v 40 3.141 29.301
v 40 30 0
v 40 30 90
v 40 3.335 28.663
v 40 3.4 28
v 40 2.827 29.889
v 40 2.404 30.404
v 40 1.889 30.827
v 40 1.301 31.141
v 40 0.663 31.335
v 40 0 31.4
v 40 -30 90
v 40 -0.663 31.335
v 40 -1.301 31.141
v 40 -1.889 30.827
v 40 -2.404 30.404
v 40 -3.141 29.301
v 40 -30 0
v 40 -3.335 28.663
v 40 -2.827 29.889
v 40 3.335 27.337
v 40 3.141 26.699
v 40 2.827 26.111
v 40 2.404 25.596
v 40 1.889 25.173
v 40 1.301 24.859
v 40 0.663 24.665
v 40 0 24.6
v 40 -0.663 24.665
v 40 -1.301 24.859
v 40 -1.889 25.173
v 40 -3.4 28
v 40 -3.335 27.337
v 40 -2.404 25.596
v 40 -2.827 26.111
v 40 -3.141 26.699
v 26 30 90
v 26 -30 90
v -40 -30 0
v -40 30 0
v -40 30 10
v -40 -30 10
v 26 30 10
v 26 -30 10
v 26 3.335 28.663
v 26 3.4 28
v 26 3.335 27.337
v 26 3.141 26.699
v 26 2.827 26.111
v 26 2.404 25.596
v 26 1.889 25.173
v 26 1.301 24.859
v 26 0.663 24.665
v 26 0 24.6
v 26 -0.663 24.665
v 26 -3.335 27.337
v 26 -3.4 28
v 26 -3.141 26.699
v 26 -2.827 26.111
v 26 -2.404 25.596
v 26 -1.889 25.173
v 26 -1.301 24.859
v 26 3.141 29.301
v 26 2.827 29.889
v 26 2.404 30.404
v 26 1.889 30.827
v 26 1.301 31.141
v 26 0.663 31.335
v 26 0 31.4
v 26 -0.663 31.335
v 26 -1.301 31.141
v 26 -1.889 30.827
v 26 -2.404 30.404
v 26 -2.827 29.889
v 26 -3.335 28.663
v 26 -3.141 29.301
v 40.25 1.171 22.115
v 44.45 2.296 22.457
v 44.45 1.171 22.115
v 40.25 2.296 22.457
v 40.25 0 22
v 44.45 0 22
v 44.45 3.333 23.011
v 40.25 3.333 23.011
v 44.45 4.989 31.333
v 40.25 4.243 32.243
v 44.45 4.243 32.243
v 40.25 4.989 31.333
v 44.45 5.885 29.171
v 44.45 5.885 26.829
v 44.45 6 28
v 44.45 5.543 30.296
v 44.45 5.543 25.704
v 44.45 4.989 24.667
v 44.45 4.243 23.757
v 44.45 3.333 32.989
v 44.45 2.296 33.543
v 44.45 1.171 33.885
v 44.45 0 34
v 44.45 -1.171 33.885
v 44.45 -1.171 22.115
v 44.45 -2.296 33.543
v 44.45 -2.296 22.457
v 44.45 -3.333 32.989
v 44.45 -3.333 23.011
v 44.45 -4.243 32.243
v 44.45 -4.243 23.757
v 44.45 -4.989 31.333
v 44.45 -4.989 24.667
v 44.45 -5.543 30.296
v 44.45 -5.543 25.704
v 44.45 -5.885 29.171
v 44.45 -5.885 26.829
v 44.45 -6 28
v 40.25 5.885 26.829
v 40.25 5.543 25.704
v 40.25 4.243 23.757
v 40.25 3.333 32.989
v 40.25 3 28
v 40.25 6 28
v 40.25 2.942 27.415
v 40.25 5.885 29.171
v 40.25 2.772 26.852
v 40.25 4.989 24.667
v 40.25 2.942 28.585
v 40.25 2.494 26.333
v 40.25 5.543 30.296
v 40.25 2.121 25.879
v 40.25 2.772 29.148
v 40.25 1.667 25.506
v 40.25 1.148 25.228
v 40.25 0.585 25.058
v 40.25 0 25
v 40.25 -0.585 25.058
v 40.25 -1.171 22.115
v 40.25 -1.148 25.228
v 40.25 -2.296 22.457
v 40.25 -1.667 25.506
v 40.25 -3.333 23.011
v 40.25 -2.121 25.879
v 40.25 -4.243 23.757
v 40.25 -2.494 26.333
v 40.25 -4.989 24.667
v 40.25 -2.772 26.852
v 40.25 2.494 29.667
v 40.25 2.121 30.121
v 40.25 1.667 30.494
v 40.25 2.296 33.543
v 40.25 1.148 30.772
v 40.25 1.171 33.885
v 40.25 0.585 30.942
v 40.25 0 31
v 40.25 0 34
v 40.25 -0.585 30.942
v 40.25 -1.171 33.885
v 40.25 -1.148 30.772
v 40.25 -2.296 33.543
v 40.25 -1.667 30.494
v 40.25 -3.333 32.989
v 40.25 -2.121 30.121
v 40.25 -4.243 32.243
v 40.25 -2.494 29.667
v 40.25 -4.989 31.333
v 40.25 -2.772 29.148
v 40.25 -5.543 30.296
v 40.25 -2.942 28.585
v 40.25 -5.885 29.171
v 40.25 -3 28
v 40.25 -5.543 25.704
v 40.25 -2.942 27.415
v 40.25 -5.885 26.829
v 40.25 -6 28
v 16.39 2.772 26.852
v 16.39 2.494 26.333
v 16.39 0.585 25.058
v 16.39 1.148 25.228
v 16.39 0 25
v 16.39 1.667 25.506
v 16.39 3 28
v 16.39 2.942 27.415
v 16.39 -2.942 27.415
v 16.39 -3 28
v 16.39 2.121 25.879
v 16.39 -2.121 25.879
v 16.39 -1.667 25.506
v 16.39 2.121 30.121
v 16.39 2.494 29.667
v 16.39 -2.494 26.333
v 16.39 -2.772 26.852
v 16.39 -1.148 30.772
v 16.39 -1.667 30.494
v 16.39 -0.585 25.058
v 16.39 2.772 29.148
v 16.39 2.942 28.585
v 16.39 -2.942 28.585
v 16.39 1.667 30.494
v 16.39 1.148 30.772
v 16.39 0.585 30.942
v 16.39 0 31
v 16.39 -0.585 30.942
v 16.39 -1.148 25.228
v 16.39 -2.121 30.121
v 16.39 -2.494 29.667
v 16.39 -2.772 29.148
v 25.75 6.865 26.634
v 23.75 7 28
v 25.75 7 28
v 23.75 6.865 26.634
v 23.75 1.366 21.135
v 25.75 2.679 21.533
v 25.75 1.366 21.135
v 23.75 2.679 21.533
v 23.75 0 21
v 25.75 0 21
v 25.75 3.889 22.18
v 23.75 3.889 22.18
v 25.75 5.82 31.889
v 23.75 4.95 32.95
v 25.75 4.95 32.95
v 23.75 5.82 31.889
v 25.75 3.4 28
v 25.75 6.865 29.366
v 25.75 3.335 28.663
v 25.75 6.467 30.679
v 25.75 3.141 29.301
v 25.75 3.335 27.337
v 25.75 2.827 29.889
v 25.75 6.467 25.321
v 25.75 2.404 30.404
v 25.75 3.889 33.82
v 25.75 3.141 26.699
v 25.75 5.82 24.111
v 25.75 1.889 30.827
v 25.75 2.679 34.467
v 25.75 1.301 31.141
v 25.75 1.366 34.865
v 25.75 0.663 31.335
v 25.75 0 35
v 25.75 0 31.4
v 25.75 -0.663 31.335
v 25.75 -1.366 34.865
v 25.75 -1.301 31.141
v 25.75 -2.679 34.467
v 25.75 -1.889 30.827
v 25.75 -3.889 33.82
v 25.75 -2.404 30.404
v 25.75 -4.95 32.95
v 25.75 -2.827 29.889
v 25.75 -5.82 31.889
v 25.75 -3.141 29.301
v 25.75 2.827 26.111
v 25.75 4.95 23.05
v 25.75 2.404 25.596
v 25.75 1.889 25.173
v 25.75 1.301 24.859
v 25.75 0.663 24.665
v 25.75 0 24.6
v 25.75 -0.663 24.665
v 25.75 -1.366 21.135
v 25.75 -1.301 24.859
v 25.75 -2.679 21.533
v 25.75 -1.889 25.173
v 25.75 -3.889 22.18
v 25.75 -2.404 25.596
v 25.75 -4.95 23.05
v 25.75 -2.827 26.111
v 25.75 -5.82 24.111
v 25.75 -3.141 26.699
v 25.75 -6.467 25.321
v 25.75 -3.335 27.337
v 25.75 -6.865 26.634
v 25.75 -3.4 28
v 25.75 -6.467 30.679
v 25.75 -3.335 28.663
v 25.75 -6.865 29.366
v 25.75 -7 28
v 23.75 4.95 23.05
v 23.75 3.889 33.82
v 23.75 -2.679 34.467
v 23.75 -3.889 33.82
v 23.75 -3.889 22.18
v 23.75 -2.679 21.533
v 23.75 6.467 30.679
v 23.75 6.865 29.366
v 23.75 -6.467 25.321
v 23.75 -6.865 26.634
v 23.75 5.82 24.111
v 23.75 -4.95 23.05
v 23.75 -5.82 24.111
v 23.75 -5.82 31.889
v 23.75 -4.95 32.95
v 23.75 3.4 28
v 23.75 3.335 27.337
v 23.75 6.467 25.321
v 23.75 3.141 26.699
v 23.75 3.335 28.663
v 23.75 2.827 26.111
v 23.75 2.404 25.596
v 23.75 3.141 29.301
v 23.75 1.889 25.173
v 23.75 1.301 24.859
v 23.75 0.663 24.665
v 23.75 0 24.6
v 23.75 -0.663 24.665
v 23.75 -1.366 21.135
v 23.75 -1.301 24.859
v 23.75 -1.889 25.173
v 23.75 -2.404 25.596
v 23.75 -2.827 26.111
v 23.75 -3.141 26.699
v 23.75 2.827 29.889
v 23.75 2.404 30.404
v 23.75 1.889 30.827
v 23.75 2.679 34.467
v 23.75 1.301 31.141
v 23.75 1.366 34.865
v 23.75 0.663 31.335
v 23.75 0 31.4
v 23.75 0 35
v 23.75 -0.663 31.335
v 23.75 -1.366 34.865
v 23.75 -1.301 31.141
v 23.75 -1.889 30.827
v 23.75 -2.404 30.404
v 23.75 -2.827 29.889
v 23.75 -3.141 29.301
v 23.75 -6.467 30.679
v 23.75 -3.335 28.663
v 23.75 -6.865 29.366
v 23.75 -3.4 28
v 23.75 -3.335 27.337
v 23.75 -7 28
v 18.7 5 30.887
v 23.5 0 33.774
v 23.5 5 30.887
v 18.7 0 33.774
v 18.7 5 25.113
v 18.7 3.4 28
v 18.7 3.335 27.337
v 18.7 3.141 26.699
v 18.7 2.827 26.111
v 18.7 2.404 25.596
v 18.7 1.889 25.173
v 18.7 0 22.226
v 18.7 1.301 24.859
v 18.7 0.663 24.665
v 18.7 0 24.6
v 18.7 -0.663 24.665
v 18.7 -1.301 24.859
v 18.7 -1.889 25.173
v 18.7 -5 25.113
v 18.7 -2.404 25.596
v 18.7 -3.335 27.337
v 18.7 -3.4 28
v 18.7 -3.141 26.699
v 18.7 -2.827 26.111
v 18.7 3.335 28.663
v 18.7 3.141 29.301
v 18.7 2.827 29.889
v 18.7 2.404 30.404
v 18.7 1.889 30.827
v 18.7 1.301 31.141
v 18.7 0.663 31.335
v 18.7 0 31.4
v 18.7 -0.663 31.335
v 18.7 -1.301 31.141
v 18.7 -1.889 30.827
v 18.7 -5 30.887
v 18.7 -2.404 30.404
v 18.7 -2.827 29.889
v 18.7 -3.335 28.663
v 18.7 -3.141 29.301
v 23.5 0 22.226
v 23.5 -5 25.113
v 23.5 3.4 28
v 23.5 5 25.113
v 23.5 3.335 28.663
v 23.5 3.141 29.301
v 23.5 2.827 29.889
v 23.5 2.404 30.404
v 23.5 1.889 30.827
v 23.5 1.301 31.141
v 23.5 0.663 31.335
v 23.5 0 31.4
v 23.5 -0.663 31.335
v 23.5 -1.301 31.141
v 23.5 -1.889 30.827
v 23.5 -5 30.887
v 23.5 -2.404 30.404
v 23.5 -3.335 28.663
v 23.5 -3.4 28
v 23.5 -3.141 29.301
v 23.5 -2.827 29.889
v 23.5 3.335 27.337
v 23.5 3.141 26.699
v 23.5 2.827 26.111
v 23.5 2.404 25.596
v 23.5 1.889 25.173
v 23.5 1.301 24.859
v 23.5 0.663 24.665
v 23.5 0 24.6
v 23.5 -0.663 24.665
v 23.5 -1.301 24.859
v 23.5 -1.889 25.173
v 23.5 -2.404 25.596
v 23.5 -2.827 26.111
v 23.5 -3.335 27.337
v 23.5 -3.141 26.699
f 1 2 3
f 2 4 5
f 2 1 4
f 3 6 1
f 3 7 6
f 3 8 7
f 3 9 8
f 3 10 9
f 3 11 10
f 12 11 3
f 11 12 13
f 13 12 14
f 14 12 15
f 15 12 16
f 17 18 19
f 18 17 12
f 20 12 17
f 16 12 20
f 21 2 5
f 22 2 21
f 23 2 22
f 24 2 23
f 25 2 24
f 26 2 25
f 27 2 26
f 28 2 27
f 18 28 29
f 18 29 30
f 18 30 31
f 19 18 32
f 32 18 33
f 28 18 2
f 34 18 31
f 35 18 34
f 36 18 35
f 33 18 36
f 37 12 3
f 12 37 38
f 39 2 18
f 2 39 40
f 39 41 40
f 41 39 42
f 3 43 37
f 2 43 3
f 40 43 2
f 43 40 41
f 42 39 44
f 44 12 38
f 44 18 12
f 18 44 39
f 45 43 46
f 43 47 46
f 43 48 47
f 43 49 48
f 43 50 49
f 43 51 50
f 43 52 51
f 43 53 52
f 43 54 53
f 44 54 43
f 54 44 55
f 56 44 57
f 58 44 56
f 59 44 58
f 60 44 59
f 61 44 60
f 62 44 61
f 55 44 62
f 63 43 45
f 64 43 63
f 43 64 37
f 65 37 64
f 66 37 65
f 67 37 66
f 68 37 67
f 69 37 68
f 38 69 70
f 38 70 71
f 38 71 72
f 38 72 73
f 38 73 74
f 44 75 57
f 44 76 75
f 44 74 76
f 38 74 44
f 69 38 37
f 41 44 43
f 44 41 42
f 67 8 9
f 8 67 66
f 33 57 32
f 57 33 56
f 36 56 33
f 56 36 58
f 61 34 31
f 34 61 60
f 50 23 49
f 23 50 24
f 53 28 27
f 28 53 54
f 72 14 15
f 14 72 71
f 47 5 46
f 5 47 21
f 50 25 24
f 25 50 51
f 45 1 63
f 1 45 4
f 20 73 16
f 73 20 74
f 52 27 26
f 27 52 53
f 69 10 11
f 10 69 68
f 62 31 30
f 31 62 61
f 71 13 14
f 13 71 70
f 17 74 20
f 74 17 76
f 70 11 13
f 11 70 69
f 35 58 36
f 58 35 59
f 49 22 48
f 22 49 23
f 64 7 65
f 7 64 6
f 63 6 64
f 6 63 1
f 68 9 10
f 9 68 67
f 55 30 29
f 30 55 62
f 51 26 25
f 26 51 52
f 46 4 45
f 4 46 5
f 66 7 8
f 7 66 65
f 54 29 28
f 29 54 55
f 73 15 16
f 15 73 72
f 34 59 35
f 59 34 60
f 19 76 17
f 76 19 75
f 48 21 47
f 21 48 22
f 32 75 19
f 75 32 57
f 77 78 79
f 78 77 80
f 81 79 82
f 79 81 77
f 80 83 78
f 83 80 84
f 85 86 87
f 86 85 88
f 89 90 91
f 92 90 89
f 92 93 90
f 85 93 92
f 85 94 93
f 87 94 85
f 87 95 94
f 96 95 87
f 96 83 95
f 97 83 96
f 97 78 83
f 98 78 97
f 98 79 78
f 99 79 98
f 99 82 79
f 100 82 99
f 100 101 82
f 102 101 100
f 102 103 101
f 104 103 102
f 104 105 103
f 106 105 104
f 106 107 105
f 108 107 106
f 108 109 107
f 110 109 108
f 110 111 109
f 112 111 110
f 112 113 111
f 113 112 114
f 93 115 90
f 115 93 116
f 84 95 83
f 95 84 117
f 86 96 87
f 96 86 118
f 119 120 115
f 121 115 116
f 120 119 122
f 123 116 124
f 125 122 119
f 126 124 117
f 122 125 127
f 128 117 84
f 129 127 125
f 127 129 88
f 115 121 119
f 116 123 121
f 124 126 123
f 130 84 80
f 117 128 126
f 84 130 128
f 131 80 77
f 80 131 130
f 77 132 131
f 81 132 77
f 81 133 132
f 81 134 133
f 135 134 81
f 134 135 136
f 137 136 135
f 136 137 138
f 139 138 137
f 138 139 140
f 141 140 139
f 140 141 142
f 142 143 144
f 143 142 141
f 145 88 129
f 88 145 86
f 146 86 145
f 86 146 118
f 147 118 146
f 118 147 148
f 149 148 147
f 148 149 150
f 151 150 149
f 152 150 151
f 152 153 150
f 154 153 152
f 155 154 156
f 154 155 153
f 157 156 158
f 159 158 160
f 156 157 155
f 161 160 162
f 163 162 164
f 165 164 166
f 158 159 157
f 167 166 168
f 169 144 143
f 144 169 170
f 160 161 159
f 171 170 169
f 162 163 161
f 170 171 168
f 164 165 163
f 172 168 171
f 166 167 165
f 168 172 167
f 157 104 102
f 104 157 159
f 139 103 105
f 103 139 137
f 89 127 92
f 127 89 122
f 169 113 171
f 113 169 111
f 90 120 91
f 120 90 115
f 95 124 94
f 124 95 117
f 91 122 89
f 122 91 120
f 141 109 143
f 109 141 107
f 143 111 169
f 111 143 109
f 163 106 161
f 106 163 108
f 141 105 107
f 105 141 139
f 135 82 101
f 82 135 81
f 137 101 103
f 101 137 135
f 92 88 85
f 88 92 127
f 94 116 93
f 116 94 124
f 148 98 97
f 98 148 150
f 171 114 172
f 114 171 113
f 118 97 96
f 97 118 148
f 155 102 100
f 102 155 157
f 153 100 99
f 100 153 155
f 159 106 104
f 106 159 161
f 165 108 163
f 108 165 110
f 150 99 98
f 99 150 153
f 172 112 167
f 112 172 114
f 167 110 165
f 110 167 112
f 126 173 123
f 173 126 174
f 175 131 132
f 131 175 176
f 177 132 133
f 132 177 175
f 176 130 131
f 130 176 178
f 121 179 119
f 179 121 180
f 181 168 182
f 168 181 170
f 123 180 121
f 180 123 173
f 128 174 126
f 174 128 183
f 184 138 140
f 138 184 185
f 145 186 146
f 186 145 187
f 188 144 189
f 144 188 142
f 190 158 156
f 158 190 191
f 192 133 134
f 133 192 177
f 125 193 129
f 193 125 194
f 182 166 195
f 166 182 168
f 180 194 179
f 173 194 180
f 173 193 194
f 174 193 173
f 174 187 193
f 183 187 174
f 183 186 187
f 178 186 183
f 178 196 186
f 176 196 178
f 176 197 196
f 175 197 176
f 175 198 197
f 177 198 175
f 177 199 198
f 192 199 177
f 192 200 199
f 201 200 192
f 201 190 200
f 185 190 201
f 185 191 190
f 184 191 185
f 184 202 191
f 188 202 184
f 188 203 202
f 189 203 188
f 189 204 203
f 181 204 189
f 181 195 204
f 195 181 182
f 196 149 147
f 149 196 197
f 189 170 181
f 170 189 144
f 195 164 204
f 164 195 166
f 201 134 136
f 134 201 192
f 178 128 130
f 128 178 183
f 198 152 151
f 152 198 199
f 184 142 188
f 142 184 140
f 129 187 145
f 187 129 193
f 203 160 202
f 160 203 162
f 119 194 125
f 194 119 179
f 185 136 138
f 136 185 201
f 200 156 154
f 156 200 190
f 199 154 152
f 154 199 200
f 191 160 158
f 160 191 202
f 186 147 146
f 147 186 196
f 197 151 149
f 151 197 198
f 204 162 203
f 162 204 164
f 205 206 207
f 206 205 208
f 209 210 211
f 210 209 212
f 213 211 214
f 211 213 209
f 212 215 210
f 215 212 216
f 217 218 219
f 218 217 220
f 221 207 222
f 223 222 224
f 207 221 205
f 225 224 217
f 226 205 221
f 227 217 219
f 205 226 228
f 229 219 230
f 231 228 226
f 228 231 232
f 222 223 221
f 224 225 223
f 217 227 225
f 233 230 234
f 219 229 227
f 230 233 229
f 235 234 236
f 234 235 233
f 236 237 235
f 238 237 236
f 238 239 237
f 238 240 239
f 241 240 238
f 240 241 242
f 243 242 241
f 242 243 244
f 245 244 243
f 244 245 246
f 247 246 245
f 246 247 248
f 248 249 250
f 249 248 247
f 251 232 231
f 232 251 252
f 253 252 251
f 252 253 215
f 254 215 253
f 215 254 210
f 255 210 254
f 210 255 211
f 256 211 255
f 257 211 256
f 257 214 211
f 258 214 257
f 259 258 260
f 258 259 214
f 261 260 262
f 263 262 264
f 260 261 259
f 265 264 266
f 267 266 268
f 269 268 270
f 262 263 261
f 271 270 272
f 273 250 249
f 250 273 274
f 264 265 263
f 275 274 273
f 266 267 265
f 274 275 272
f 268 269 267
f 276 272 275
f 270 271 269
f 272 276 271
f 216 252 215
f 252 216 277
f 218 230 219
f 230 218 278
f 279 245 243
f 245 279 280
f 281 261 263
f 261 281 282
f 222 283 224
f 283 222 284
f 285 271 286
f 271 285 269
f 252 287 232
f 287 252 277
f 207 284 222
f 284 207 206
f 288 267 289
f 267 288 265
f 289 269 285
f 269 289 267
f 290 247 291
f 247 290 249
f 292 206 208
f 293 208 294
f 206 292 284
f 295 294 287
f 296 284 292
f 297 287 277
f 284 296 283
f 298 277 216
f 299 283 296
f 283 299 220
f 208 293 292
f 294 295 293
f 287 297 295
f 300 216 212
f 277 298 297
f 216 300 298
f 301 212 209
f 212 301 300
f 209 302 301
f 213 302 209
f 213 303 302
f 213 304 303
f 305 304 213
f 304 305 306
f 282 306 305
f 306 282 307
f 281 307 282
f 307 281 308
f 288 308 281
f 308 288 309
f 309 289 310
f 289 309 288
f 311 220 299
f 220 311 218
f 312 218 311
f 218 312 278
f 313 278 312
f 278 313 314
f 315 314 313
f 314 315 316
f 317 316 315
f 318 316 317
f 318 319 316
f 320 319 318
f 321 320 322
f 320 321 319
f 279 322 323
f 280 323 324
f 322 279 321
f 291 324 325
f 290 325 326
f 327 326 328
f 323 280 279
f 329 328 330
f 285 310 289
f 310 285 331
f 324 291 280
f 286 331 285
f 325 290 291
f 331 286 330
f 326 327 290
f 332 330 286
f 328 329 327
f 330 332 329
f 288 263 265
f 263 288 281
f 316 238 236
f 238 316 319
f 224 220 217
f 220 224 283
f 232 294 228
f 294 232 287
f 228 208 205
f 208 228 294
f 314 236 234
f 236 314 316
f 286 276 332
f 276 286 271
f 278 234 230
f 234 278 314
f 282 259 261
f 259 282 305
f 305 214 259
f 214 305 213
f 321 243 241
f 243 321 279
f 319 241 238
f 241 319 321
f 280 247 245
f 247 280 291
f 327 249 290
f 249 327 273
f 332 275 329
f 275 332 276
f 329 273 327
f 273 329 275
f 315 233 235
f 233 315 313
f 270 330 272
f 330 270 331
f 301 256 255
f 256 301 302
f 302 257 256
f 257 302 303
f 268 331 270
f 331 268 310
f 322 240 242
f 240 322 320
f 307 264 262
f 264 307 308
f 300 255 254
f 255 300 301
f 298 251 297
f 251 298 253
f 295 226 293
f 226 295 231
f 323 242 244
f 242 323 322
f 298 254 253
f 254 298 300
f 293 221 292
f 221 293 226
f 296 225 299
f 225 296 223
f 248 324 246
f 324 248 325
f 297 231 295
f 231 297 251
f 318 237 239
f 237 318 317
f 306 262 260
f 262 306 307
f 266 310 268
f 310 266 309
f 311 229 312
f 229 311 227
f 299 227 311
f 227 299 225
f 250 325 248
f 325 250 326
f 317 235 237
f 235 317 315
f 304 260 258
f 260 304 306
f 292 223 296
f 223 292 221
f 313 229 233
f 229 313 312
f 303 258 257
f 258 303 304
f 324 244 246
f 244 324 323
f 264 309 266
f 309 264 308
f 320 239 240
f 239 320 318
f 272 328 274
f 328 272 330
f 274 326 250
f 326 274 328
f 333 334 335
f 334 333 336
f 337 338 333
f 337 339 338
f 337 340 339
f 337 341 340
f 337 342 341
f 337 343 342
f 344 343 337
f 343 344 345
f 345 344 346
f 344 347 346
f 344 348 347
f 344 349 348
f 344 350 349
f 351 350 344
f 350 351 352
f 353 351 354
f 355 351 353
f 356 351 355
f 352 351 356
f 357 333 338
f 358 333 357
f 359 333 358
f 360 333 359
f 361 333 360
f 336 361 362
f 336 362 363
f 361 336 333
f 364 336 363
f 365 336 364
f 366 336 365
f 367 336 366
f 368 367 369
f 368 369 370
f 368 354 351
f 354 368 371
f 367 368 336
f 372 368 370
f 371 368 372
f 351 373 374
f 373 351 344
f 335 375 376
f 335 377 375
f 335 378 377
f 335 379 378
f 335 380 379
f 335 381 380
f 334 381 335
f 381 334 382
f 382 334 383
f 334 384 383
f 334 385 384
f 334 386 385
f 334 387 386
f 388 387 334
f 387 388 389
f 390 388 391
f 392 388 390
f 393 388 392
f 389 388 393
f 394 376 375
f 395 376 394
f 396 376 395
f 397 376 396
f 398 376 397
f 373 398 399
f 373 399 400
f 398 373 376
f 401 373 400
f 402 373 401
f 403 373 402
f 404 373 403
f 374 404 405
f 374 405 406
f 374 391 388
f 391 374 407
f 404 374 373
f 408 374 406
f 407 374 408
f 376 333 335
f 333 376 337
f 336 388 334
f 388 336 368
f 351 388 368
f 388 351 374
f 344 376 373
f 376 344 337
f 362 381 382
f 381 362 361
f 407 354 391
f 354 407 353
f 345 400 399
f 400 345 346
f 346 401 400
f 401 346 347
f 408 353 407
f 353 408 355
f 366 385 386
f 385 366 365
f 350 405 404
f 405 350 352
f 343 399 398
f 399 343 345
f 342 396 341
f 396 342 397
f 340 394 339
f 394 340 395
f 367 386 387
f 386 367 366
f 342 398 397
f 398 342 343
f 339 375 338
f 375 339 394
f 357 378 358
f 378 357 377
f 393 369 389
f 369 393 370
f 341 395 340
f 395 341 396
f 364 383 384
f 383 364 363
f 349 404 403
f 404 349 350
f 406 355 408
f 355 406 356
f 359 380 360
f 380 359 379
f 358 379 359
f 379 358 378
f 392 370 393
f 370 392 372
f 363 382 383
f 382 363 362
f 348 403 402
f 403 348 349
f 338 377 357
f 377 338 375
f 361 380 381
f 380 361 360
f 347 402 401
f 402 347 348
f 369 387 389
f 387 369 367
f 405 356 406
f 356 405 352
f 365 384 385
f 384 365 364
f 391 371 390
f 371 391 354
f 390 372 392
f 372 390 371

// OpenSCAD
$fn = 32;

// ------------------------------------------------------------------------
// Bolted bracket: 80 x 60 mm bracket with 1 bolt joints
// Every part is its own module, assembly() places them once.
// ------------------------------------------------------------------------

// --- part 1 ---
module bracket() {
  difference() {
    translate([-40, -30, 0]) cube([80, 60, 90]);
    translate([-41, -31, 10]) cube([67, 62, 81]);
    translate([33, 0, 28]) rotate([0, 90, 0]) cylinder(h = 16, d = 6.8, center = true);
  }
}

// --- part 2 ---
module bolt() {
  cylinder(h = 4.2, d = 12);
  translate([0, 0, -23.86]) cylinder(h = 23.86, d = 6);
}

// --- part 3 ---
module washer() {
  difference() {
      translate([0, 0, 0]) cylinder(h = 2, d = 14);
      translate([0, 0, -1]) cylinder(h = 4, d = 6.8);
    }
}

// --- part 4 ---
module nut() {
  difference() {
    linear_extrude(height = 4.8) polygon(points = [[5.774, 0], [2.887, 5], [-2.887, 5], [-5.774, 0], [-2.887, -5], [2.887, -5]]);
    translate([0, 0, -1]) cylinder(h = 6.8, d = 6.8);
  }
}

// --- assembly ---
module assembly() {
  translate([0, 0, 0]) rotate([0, 0, 0]) bracket();
  translate([40.25, 0, 28]) rotate([0, 90, 0]) bolt();
  translate([23.75, 0, 28]) rotate([0, 90, 0]) washer();
  translate([18.7, 0, 28]) rotate([0, 90, 0]) nut();
}

assembly();
